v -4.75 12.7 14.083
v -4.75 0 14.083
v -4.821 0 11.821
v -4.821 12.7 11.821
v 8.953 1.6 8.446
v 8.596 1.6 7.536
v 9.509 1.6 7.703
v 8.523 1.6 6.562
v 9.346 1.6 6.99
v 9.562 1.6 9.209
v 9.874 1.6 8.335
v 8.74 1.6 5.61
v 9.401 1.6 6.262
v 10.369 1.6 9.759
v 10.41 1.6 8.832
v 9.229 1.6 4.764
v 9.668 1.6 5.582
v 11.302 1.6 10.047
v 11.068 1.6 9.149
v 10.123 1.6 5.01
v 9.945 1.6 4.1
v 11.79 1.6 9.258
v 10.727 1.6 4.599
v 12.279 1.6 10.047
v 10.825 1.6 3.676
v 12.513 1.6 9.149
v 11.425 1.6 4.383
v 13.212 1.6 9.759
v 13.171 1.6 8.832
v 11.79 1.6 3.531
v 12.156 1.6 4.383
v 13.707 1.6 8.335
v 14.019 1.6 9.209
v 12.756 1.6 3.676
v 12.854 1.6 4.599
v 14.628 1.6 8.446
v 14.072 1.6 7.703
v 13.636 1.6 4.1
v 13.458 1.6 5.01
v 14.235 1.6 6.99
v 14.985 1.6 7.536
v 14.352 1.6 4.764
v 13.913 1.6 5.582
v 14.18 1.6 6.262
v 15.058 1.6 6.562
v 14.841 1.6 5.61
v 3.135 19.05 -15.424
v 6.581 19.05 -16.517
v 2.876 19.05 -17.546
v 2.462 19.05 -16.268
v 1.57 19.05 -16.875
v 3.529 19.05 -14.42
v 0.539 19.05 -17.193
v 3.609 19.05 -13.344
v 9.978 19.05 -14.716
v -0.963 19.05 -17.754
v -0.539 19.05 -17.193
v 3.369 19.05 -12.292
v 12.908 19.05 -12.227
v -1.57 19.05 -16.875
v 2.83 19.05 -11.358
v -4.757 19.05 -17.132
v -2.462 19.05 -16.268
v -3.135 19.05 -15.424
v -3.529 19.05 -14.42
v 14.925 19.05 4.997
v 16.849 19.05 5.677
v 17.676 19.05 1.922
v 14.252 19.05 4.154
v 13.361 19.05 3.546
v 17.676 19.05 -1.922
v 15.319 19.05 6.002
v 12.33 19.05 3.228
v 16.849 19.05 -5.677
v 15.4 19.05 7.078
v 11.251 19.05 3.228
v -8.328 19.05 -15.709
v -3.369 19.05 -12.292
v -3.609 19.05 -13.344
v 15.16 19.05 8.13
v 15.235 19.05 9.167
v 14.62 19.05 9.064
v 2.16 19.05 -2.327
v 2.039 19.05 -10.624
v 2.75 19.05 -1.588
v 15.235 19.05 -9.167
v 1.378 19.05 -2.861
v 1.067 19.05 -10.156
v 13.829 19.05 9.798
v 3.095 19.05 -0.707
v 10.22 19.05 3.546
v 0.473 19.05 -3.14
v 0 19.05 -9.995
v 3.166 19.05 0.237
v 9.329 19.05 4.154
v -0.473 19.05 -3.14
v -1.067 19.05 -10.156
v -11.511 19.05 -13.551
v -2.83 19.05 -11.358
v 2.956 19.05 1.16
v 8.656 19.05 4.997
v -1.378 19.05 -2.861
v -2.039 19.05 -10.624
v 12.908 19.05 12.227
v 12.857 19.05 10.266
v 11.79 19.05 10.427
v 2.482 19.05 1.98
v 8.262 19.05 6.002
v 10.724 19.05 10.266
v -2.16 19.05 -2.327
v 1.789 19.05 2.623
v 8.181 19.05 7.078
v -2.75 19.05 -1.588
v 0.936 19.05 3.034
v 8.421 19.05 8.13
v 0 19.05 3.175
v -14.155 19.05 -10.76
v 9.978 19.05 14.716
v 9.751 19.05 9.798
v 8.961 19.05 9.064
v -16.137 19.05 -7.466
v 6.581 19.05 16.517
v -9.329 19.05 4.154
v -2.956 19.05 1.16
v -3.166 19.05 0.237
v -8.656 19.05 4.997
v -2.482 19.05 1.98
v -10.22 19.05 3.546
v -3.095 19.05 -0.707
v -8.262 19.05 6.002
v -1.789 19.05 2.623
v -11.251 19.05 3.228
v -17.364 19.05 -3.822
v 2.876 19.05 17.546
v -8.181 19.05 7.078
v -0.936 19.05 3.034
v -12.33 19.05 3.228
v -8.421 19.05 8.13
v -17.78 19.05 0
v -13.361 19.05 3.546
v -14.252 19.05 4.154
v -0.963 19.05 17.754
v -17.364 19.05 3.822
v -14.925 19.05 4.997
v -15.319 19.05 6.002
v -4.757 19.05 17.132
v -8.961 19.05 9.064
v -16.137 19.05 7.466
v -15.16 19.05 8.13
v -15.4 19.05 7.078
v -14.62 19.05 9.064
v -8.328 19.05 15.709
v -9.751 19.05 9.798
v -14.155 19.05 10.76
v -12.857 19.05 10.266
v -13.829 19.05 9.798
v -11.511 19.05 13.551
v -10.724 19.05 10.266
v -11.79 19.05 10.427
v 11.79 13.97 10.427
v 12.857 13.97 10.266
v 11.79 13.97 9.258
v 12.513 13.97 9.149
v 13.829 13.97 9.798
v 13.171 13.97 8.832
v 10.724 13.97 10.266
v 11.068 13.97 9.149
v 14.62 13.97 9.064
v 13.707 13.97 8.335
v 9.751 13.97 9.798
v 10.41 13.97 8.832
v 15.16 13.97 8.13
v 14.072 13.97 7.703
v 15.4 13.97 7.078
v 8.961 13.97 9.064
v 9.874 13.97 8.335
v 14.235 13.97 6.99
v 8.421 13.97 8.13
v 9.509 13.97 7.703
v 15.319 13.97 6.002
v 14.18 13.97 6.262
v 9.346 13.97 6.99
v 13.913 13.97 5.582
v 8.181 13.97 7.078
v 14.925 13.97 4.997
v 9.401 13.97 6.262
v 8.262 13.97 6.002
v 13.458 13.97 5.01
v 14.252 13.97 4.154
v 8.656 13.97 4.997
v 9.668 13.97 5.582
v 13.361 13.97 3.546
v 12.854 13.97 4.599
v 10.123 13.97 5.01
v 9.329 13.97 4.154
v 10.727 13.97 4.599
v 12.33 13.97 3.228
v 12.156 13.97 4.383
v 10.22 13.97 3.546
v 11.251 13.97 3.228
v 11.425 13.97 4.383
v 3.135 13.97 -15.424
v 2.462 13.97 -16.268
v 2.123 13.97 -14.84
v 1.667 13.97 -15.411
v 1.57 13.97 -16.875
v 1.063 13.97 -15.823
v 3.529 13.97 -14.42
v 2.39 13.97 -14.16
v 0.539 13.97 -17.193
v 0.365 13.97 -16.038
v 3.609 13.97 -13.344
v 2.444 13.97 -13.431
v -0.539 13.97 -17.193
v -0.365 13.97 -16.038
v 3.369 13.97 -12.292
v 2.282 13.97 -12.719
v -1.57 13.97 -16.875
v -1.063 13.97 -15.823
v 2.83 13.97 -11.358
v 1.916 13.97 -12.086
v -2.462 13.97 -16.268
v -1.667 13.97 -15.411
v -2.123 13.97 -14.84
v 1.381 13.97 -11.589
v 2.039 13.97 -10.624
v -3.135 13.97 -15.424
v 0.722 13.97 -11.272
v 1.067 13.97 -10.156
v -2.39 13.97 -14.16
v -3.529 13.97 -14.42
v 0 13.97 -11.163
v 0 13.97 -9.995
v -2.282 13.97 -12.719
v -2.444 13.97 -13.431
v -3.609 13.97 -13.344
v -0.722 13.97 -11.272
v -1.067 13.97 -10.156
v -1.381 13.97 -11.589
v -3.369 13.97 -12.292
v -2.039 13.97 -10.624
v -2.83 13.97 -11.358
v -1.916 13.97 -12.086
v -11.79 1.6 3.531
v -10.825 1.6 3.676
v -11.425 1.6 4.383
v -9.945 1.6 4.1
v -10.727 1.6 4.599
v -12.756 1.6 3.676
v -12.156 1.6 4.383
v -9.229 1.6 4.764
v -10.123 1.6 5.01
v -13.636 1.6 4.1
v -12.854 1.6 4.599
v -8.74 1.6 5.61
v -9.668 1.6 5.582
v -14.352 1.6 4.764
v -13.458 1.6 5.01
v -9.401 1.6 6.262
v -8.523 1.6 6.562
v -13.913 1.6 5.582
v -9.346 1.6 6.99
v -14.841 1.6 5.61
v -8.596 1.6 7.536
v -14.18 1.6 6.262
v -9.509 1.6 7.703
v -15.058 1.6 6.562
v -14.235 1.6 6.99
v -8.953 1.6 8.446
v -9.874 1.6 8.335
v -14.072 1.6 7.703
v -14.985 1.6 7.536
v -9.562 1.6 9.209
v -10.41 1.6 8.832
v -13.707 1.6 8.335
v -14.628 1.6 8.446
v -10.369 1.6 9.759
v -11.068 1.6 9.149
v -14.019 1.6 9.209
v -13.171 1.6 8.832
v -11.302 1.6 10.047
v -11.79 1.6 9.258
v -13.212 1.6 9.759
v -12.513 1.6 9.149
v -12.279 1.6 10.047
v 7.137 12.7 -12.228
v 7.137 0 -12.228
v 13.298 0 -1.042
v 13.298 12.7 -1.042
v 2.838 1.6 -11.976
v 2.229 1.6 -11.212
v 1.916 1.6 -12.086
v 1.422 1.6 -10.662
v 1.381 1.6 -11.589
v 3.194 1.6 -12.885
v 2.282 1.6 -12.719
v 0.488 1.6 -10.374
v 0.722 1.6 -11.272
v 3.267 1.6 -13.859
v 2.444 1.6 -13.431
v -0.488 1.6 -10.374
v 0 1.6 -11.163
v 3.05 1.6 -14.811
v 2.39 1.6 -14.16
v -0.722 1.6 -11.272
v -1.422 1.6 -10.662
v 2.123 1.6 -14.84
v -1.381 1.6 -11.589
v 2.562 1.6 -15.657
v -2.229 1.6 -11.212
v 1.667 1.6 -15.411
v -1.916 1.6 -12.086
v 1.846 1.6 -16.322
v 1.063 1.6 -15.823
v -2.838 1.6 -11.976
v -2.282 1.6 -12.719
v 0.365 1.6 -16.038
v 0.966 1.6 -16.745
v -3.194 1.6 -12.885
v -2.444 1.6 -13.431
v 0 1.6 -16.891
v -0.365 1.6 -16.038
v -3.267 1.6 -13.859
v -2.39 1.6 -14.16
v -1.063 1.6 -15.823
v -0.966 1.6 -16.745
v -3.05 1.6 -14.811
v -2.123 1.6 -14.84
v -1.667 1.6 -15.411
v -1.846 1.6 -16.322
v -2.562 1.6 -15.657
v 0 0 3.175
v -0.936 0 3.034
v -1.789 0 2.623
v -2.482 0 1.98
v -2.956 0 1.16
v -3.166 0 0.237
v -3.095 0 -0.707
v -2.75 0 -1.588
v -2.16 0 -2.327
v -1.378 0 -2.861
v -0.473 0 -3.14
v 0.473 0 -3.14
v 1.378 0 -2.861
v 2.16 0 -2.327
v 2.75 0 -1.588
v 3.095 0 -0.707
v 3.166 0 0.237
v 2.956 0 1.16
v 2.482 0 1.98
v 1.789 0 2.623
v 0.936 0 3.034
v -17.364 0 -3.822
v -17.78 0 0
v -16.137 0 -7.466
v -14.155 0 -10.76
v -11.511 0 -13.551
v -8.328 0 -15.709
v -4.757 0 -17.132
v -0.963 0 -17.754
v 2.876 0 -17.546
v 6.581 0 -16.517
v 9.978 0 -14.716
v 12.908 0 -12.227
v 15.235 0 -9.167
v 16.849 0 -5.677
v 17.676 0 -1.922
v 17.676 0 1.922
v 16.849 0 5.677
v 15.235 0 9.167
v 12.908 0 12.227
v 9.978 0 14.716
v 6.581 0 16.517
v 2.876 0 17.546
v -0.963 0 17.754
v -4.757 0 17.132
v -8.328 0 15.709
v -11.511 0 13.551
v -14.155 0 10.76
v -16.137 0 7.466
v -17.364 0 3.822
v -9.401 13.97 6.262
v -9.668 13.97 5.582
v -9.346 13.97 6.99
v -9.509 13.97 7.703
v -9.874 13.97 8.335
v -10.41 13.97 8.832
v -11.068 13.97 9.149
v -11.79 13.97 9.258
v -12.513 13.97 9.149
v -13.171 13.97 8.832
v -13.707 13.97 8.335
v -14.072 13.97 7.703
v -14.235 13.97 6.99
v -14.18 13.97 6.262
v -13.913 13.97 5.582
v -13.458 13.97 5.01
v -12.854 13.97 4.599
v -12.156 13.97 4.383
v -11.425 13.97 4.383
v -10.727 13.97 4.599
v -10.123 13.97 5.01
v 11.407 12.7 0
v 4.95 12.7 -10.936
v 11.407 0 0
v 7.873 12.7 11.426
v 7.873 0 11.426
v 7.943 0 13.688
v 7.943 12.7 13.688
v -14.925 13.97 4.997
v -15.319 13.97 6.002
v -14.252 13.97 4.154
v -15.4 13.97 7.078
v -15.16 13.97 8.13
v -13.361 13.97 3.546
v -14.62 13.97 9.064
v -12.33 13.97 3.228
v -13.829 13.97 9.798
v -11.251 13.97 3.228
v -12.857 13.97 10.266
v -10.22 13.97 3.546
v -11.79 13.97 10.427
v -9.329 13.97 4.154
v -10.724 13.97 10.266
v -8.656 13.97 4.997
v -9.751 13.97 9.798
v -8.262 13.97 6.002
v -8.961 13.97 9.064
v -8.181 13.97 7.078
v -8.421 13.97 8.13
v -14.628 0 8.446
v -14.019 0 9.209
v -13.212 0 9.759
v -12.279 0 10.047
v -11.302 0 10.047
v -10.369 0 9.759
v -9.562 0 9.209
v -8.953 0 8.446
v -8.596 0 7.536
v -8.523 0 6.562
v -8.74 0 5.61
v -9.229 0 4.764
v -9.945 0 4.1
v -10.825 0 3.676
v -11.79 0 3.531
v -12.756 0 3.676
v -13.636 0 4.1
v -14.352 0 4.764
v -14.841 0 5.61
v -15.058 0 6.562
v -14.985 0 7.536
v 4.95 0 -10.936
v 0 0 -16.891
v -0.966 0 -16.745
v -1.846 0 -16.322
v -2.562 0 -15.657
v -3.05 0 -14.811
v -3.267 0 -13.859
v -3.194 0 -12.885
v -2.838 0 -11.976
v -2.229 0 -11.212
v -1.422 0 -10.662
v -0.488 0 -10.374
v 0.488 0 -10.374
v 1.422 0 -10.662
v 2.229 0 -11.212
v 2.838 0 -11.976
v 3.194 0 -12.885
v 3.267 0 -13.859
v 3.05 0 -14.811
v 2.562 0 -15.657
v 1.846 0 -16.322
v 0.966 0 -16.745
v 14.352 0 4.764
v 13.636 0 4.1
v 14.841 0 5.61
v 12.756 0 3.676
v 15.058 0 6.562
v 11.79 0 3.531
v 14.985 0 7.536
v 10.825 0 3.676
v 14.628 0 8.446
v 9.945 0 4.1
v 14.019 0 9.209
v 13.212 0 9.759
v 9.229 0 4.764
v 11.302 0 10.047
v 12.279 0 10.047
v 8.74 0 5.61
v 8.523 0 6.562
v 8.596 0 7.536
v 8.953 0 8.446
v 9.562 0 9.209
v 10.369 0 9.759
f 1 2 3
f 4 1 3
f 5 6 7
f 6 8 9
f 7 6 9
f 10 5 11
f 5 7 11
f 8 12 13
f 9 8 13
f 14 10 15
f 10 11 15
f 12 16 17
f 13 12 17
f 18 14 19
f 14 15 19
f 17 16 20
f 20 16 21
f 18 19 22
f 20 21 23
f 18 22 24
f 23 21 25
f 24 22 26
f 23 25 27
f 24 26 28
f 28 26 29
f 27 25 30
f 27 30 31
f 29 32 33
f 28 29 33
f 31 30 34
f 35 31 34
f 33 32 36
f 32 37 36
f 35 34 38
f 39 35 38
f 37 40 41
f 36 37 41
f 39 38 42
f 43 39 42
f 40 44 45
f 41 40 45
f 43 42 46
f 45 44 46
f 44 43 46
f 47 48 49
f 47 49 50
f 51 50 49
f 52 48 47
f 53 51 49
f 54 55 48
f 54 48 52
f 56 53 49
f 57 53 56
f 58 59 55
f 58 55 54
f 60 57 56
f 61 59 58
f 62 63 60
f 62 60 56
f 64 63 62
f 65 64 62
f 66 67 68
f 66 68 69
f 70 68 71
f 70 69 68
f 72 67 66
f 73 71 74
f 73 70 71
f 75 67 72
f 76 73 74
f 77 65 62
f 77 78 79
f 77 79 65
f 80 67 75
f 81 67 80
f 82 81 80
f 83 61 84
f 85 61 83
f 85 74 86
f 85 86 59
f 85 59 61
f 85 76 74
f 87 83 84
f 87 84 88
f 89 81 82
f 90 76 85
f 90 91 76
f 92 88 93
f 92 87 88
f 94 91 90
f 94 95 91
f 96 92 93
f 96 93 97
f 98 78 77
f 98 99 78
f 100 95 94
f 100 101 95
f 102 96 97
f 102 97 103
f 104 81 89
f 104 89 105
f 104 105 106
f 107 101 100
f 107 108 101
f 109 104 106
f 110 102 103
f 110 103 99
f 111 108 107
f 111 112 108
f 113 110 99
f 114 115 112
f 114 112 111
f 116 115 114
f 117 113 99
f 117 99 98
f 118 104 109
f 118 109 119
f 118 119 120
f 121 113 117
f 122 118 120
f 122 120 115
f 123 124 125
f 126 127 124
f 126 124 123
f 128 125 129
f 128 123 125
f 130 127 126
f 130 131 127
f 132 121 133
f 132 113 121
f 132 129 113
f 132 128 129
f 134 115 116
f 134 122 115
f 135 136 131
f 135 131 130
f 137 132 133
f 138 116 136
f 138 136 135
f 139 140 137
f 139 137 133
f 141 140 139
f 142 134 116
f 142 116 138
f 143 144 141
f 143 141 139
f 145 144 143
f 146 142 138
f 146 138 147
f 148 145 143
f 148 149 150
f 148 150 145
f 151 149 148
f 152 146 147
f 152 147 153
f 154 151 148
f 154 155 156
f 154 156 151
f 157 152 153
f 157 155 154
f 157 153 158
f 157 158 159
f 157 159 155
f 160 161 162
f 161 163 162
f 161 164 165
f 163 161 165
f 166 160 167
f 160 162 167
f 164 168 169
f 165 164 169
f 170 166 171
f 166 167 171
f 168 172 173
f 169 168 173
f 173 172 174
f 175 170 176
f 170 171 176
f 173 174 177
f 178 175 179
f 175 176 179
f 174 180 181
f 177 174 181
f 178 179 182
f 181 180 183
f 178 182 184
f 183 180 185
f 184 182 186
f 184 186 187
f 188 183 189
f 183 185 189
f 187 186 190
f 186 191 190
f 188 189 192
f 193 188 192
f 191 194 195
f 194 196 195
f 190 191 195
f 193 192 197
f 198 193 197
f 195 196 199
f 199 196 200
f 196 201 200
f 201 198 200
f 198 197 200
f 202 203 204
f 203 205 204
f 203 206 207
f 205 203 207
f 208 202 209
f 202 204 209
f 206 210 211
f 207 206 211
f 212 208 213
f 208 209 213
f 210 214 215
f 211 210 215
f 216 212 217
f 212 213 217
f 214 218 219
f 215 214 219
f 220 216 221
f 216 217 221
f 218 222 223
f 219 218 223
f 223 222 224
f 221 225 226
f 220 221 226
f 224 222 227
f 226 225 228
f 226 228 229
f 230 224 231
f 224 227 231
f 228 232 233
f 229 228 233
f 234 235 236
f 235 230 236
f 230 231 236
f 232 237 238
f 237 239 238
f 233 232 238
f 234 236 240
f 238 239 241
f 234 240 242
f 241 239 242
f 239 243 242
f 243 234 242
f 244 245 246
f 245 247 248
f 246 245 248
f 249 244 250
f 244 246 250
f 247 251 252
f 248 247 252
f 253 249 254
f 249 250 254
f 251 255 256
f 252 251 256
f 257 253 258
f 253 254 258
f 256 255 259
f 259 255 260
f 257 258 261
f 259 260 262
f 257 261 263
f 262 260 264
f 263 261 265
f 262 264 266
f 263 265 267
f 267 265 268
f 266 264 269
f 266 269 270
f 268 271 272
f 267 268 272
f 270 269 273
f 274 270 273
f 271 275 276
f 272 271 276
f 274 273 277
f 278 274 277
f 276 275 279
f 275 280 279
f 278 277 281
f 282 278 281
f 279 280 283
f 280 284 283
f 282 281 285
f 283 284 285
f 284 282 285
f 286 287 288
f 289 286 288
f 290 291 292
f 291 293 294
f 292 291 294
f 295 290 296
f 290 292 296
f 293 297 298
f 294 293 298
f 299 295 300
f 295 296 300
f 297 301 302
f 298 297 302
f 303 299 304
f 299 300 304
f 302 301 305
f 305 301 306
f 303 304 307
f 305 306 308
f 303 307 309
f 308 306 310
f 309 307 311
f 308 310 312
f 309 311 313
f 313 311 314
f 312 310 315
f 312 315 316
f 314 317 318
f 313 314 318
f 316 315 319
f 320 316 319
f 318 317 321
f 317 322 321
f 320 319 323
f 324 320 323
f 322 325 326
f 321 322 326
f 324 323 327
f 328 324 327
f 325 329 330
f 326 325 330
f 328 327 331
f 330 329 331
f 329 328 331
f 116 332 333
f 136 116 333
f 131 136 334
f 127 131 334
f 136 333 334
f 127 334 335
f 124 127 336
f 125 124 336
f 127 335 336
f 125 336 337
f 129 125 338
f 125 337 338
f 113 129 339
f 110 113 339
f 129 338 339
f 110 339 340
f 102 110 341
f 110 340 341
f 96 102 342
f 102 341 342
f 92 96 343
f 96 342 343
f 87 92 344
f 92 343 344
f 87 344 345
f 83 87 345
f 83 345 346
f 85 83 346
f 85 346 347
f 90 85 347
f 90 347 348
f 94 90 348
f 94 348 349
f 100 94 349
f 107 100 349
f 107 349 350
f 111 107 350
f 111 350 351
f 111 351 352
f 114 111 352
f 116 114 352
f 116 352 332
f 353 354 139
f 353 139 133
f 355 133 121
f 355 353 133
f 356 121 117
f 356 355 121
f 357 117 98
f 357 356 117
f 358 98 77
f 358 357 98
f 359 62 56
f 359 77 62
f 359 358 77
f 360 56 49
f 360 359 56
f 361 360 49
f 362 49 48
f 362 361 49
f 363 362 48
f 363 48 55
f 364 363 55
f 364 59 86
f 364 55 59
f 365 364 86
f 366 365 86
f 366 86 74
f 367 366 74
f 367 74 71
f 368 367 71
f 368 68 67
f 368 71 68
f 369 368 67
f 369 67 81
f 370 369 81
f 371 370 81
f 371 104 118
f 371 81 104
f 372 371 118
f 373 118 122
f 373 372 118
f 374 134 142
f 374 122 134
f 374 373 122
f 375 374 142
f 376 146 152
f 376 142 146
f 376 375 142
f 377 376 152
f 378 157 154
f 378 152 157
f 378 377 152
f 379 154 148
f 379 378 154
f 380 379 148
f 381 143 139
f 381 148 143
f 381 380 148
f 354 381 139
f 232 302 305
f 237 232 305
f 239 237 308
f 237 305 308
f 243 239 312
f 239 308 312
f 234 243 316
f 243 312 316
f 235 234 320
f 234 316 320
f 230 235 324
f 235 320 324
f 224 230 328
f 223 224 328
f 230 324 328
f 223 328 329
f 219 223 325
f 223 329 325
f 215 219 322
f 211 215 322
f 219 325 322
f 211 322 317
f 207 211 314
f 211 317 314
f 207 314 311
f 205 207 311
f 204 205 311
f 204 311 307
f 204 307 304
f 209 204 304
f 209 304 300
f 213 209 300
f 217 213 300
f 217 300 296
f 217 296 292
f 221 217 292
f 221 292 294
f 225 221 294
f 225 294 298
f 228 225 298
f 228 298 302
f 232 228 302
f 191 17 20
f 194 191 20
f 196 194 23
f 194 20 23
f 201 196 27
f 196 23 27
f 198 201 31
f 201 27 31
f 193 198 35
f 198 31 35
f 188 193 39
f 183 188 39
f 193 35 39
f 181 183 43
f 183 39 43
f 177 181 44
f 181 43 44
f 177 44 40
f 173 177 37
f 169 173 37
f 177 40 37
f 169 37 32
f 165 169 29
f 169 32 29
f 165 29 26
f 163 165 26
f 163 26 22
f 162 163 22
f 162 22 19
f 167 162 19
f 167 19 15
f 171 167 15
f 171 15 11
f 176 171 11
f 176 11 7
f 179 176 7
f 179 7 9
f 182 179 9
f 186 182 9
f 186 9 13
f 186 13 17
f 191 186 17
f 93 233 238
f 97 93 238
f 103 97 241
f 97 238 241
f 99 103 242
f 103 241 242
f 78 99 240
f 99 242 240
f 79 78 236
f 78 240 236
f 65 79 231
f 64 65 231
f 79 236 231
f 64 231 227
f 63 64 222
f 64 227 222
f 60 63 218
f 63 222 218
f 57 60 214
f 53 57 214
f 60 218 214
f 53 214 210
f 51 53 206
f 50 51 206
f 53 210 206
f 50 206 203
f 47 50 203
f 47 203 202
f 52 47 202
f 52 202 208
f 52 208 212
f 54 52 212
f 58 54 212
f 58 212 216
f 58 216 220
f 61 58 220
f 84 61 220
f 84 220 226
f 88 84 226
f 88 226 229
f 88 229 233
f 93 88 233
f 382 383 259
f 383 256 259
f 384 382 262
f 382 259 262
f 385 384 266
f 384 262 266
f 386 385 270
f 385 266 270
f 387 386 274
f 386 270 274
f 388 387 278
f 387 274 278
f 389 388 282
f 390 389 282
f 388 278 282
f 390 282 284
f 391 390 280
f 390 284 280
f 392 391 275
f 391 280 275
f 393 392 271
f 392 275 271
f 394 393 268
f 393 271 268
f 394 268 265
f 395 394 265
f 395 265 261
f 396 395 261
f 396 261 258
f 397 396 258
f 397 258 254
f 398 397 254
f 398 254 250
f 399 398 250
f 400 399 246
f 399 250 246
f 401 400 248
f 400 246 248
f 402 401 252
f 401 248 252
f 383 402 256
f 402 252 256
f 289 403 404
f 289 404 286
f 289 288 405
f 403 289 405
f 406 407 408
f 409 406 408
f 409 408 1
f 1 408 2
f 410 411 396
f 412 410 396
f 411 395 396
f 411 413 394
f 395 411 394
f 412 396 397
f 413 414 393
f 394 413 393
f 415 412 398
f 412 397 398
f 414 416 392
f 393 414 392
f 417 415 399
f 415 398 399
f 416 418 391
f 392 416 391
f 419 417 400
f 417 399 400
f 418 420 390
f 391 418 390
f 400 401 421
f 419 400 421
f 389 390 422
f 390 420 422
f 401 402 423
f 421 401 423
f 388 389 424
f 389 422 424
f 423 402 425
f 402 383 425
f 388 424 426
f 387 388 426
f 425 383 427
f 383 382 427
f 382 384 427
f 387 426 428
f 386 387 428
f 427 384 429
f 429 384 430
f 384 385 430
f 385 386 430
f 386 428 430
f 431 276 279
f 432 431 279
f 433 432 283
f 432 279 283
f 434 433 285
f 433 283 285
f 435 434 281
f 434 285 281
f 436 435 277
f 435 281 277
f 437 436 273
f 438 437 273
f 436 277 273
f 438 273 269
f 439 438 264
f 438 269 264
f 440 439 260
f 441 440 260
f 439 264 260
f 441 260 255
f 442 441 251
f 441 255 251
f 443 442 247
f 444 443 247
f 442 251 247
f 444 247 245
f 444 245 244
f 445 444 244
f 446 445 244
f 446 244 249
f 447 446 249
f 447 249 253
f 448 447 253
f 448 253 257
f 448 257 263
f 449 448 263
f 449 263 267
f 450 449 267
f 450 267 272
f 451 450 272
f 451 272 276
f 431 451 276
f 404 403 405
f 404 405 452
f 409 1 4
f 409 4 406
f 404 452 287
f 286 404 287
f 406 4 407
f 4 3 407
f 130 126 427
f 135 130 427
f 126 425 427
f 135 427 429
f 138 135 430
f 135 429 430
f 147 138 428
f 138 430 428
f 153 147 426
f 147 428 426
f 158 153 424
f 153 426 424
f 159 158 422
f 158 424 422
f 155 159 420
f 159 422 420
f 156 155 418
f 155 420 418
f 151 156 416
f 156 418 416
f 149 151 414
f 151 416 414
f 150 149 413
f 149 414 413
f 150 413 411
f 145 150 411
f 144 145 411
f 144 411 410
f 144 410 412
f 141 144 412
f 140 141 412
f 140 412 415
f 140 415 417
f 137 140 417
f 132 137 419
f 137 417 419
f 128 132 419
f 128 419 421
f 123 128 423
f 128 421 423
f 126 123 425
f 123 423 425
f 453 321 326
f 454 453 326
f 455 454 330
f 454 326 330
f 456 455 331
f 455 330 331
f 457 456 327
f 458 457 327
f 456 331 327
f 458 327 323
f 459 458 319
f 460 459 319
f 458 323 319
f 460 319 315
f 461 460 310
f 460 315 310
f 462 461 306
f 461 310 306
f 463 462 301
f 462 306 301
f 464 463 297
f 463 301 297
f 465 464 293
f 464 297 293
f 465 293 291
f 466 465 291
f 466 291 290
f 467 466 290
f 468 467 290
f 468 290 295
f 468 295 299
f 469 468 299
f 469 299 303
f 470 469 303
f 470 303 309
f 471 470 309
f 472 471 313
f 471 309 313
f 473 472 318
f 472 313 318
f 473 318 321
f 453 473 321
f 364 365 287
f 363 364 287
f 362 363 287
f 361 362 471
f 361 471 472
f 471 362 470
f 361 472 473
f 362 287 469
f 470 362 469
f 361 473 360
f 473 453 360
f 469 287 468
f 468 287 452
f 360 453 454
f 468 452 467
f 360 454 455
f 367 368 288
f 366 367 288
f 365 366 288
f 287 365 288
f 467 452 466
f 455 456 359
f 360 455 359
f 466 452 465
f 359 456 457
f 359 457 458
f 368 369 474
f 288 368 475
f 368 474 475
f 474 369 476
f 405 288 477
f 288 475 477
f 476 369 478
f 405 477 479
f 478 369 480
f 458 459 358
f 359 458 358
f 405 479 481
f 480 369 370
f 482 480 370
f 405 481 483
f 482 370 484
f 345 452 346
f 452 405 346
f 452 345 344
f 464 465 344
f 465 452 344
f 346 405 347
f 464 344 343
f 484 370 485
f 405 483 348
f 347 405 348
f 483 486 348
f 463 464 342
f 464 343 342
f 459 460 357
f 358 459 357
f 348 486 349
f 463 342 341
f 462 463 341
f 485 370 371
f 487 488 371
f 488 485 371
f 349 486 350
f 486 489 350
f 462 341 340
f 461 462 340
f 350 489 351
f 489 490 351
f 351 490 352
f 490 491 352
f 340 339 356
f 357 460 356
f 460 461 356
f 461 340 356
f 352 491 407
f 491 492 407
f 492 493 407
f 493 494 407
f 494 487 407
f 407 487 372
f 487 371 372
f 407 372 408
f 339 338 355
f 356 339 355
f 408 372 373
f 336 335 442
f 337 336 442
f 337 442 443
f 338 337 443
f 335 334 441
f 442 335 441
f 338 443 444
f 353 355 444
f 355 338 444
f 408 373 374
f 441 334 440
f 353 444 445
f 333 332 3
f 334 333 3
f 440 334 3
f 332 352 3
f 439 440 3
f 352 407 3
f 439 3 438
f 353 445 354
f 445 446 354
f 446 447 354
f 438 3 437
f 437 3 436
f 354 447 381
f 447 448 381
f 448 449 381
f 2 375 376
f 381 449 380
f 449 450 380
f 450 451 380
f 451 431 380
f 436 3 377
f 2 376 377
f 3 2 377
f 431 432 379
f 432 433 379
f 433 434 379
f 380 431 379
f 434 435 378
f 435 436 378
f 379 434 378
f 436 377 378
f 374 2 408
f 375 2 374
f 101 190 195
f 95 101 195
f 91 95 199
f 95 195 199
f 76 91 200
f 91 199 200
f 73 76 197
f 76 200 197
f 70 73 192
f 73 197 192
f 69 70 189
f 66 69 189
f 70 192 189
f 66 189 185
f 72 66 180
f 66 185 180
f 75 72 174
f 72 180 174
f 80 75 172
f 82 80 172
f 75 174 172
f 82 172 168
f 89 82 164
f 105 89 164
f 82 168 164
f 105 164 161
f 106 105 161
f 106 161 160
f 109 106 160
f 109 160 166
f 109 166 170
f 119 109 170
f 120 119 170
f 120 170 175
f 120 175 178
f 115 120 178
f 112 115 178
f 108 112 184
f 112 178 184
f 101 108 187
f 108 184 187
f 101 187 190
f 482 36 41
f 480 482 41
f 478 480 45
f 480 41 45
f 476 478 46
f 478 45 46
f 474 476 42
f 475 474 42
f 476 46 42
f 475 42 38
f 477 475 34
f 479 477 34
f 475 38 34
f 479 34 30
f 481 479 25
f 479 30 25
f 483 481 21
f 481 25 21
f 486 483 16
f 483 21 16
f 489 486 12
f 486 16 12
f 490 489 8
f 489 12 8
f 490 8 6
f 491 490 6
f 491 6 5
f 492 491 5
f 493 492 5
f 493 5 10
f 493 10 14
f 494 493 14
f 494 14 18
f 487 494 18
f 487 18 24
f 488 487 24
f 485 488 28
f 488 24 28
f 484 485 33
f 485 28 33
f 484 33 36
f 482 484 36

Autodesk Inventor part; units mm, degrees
ref_plane "YZ Plane" through (0, 0, 0) normal (1, 0, 0) x (0, 1, 0)
ref_plane "XZ Plane" through (0, 0, 0) normal (0, 1, 0) x (-1, 0, 0)
ref_plane "XY Plane" through (0, 0, 0) normal (0, 0, 1) x (1, 0, 0)
sketch "Sketch1" plane through (0, 0, 0) normal (0, 1, 0) x (-1, 0, 0)
  line L0 (0, 0) -> (13.6144, 0)
  circle A0 centre (0, 0) radius 17.78
  dimension "d0" = 13.6144
  dimension "d1" = 35.56
extrude "Extrusion1" add sketch "Sketch1" along normal blind 19.05
sketch "Sketch3" plane through (0, 19.05, 0) normal (0, 1, 0) x (1, 0, 0)
  line L0 (0, 0) -> (0, 13.6144)
  line L1 (0, 0) -> (13.6144, 0) construction
  dimension "d4" = 13.6144
  dimension "d5" = 90
hole "Hole1" at (0, 19.05, -13.6144) direction (0, -1, 0) diameter 4.9022 end through all counterbore diameter 7.239 counterbore depth 5.08
sketch "Sketch4" plane through (0, 0, 0) normal (0, -1, 0) x (1, 0, 0)
  circle A0 centre (0, -13.6144) radius 2.4511 projected
  line L0 (0, 0) -> (0, -13.6144)
hole "Hole2" at (0, 0, -13.6144) direction (0, 1, 0) diameter 4.9022 depth 6.35 counterbore diameter 6.5532 counterbore depth 1.6002
pattern_circular "Circular Pattern1" count 3 over 360 about axis through (0, 0, 0) along (0, 1, 0) of "Hole1", "Hole2"
sketch "Sketch6" plane through (0, 19.05, 0) normal (0, 1, 0) x (1, 0, 0)
  point P0 (0, 0)
  point P1 (0, 0)
hole "Hole3" at (0, 19.05, 0) direction (0, -1, 0) diameter 6.35 end through all
sketch "Sketch10" plane through (0, 0, 0) normal (0, -1, 0) x (1, 0, 0)
  line L0 (7.9434, 13.6879) -> (-4.7505, 14.0829)
  line L1 (-4.7505, 14.0829) -> (-4.8208, 11.8209)
  line L2 (-4.8208, 11.8209) -> (7.873, 11.426)
  line L3 (7.873, 11.426) -> (7.9434, 13.6879)
  line L4 (11.4066, 0) -> (4.9497, -10.9361)
  line L5 (4.9497, -10.9361) -> (7.1371, -12.2276)
  line L6 (7.1371, -12.2276) -> (13.2977, -1.0415)
  line L7 (13.2977, -1.0415) -> (11.4066, 0)
  point P0 (0, 0)
  dimension "d38" = 12.7
  dimension "d39" = 12.7
extrude "Extrusion2" cut sketch "Sketch10" against normal blind 12.7
properties part number "table"
